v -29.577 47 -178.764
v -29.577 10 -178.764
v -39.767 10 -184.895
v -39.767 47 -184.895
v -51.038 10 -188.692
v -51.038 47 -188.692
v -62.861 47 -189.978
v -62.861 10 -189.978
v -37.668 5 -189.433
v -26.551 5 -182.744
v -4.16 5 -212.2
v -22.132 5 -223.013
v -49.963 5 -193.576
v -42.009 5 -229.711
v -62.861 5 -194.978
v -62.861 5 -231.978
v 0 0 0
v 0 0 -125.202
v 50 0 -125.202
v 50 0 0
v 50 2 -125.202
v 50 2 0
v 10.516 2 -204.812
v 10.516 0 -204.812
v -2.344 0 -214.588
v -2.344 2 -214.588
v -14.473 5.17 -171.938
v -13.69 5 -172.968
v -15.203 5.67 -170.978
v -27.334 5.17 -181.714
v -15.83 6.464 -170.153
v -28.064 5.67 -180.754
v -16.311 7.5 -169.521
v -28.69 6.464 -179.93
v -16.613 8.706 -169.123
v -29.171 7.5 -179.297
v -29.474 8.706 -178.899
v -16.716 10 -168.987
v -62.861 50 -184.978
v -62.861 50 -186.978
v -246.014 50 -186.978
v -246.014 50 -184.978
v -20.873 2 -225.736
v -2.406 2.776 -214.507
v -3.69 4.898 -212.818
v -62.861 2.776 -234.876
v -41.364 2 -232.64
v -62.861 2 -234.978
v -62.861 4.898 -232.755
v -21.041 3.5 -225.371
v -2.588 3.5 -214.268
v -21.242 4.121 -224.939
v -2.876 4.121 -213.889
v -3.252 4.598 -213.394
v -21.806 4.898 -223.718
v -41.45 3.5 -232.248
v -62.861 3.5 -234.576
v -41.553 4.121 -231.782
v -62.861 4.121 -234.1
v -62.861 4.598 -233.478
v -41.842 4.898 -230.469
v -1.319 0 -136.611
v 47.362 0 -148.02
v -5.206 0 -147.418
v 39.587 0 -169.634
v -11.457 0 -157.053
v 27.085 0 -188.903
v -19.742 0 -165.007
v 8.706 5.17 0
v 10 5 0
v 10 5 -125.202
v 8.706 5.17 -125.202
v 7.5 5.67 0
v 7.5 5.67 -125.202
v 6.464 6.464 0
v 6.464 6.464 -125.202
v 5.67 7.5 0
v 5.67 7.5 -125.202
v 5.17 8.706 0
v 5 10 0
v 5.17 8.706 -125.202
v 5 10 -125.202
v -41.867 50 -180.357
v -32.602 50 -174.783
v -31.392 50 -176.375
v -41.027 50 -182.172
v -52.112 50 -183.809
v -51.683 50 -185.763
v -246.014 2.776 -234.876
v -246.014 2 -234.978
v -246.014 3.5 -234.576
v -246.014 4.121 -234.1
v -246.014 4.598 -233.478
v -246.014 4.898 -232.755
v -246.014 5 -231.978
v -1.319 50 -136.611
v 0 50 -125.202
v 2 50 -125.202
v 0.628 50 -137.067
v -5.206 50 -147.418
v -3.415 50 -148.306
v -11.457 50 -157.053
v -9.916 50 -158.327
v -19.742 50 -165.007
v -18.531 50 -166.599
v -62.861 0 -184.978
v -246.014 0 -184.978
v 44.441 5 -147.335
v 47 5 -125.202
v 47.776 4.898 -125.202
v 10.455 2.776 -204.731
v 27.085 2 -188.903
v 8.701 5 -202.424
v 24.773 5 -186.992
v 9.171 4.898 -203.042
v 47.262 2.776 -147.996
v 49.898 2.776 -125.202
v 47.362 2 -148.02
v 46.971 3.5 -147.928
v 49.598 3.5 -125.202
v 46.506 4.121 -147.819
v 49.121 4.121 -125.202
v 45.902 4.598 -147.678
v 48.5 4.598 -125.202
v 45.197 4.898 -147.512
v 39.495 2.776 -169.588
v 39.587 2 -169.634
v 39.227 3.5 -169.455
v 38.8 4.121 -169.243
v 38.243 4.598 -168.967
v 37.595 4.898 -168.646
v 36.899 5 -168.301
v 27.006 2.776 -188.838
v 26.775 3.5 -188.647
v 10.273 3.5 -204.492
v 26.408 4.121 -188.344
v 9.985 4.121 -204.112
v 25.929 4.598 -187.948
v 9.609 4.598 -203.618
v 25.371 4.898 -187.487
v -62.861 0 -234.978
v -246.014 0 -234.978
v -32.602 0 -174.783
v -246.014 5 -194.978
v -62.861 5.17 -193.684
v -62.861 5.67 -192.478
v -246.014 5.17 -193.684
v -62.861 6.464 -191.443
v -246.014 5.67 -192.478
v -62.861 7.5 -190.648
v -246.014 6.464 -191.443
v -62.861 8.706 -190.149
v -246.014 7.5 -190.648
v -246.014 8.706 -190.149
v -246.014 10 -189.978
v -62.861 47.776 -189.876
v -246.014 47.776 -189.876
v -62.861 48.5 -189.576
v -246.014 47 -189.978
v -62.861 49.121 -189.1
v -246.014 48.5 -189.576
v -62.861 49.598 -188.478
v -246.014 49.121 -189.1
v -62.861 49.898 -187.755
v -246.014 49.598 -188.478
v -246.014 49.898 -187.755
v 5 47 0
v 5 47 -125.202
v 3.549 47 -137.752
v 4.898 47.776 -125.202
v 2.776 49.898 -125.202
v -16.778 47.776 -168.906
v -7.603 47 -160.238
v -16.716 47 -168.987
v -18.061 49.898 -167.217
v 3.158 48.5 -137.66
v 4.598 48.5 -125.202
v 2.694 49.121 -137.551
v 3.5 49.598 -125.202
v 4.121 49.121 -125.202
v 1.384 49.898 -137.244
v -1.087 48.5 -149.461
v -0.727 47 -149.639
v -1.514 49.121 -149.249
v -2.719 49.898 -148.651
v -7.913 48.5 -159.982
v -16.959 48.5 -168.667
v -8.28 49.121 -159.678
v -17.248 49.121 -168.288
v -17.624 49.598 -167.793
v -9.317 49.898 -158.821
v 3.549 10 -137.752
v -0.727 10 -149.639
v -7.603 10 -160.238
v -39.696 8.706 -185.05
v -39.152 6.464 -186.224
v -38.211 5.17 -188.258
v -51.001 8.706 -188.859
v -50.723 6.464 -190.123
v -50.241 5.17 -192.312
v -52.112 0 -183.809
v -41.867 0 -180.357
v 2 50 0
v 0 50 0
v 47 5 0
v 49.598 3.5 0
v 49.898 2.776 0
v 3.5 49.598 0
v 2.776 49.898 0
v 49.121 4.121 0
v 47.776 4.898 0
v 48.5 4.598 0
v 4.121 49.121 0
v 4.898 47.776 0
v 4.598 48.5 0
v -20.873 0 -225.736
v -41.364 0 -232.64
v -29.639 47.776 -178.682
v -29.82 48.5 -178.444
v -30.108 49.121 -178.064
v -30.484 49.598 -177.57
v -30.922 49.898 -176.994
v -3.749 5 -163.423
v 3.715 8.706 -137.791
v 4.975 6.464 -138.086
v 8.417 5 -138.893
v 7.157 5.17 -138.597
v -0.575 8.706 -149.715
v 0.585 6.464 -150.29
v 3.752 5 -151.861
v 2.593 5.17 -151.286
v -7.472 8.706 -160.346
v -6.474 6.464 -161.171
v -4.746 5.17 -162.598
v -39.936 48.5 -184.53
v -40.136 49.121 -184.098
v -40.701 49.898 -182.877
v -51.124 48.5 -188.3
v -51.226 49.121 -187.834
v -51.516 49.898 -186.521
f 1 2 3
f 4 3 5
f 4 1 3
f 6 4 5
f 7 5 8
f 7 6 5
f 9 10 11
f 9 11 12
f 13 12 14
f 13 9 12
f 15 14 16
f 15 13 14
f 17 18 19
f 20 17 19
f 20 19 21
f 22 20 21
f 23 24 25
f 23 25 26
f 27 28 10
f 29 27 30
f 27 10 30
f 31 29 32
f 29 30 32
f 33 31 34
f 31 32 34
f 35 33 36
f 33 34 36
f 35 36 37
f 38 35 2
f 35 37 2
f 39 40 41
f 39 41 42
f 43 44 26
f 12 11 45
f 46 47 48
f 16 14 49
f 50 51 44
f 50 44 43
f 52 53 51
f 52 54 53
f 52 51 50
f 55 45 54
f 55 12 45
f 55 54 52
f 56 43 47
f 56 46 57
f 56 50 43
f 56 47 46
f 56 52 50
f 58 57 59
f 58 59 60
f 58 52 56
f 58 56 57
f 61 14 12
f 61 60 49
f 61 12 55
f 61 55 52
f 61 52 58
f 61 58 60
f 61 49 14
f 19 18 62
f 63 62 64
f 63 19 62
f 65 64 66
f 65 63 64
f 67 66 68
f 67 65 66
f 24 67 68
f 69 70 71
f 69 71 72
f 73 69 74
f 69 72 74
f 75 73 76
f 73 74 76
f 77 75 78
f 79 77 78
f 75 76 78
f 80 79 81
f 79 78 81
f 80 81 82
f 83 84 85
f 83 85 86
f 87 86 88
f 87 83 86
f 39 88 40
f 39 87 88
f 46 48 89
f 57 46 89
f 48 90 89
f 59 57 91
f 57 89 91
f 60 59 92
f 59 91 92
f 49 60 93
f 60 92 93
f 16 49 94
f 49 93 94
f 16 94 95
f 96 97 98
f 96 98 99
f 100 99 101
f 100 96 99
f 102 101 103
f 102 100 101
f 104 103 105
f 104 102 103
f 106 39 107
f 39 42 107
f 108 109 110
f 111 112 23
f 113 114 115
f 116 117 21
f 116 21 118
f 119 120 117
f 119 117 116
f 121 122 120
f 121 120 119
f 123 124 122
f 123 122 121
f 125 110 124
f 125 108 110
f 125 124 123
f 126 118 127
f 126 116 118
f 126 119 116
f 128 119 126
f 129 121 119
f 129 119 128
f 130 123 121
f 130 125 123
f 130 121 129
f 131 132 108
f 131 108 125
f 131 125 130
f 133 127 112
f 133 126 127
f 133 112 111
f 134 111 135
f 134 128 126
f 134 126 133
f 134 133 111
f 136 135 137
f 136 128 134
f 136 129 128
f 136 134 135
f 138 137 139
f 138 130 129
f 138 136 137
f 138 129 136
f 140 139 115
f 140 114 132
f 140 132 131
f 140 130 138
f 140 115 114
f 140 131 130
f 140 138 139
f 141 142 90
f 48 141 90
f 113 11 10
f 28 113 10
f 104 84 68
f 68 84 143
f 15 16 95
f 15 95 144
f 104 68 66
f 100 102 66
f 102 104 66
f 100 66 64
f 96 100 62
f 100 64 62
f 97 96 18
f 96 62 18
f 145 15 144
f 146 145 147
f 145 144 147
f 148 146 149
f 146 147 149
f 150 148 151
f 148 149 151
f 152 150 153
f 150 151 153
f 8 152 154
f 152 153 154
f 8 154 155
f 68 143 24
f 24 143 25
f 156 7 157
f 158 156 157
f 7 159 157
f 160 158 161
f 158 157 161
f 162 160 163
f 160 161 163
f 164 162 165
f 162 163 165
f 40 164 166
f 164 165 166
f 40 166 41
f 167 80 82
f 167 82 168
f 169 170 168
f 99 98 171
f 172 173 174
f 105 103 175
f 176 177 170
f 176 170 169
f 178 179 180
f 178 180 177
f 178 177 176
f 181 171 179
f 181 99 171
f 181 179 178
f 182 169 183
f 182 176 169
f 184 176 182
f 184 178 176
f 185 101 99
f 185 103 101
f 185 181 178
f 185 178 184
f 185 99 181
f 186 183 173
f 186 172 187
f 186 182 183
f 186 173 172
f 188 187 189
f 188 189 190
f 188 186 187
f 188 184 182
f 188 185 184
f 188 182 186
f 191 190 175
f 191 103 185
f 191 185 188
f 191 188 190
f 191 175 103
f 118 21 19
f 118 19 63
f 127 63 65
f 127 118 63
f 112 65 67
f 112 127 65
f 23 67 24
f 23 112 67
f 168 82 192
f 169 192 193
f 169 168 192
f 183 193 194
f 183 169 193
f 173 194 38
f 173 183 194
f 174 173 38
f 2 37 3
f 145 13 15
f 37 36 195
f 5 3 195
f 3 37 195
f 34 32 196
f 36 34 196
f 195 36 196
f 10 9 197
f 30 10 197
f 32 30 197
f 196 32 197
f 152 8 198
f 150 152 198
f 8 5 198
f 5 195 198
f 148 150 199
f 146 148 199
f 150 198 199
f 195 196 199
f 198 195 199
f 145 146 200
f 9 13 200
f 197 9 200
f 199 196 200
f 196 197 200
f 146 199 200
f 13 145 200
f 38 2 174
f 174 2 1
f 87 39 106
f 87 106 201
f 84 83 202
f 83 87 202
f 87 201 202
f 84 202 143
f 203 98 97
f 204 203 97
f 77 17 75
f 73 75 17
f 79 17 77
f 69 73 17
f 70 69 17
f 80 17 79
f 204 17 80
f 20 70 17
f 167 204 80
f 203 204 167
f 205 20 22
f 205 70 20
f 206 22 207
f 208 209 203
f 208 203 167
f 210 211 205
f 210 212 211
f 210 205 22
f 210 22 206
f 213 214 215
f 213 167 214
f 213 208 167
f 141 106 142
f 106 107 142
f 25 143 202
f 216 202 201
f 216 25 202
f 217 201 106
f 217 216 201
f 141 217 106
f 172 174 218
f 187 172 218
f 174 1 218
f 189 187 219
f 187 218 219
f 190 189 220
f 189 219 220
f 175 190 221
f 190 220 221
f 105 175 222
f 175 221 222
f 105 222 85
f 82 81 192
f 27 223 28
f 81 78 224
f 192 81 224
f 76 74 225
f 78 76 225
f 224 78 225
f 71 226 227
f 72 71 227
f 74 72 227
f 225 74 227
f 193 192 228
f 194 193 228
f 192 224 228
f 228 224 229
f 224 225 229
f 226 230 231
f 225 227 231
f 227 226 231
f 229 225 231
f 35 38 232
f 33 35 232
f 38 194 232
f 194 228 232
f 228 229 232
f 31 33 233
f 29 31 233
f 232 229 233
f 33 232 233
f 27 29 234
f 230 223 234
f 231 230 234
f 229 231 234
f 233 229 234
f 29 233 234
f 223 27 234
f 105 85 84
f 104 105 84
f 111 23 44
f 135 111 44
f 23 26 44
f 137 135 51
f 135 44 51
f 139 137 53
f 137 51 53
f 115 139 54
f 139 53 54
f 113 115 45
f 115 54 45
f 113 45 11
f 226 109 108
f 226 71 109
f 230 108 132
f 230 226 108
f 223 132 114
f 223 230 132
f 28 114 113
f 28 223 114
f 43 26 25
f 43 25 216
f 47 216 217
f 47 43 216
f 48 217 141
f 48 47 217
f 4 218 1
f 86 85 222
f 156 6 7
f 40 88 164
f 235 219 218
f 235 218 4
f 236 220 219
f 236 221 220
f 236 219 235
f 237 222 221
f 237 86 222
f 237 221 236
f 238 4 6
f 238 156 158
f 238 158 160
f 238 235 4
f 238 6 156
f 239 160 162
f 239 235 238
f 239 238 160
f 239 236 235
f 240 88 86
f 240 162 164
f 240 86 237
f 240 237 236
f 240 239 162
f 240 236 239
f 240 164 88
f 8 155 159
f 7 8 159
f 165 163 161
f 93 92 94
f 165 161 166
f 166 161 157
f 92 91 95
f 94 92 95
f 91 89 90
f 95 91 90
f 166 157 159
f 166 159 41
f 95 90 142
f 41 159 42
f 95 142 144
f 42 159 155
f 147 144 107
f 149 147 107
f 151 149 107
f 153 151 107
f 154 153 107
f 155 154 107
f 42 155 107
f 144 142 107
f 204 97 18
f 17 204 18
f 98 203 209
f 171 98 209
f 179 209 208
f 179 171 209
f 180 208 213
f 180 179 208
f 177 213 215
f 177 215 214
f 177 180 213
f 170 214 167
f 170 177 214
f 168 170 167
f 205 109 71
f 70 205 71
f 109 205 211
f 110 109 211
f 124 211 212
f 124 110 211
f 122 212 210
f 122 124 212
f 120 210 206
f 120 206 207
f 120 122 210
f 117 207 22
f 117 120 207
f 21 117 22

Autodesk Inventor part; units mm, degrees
ref_plane "YZ Plane" through (0, 0, 0) normal (1, 0, 0) x (0, 1, 0)
ref_plane "XZ Plane" through (0, 0, 0) normal (0, 1, 0) x (-1, 0, 0)
ref_plane "XY Plane" through (0, 0, 0) normal (0, 0, 1) x (1, 0, 0)
sketch "Эскиз1" plane through (0, 0, 0) normal (0, 0, 1) x (1, 0, 0)
  line L0 (0, 0) -> (0, 50)
  line L1 (0, 50) -> (2, 50)
  line L2 (5, 47) -> (5, 10)
  line L3 (10, 5) -> (47, 5)
  line L4 (50, 2) -> (50, 0)
  line L5 (50, 0) -> (0, 0)
  arc A0 (5, 47) -> (2, 50) centre (2, 47) ccw
  arc A1 (5, 10) -> (10, 5) centre (10, 10) ccw
  arc A2 (50, 2) -> (47, 5) centre (47, 2) ccw
  point P0 (5, 50)
  point P1 (5, 5)
  point P2 (50, 5)
  dimension "d6" = 50
  dimension "d7" = 5
  dimension "d8" = 45
  dimension "d9" = 45
  dimension "d10" = 3
  dimension "d11" = 5
  dimension "d12" = 3
sketch "Эскиз2" plane through (0, 0, 0) normal (0, 1, 0) x (-1, 0, 0)
  point P0 (0, 0)
sketch "Эскиз3" plane through (0, 0, 0) normal (0, 1, 0) x (-1, 0, 0)
  line L0 (0, 0) -> (0, -125.202)
  line L1 (19.7417, -165.0069) -> (32.6025, -174.7832)
  line L2 (62.8608, -184.9783) -> (246.0141, -184.9783)
  arc A0 (0, -125.202) -> (19.7417, -165.0069) centre (50, -125.202) ccw
  arc A1 (32.6025, -174.7832) -> (62.8608, -184.9783) centre (62.8608, -134.9783) ccw
  point P0 (0, -150)
  point P1 (46.0141, -184.9783)
  dimension "d13" = 150
  dimension "d14" = 200
  dimension "d15" = 50
sweep "Сдвиг1" add profiles "Эскиз1" path "Эскиз3"
properties part number "lab_4_3"
